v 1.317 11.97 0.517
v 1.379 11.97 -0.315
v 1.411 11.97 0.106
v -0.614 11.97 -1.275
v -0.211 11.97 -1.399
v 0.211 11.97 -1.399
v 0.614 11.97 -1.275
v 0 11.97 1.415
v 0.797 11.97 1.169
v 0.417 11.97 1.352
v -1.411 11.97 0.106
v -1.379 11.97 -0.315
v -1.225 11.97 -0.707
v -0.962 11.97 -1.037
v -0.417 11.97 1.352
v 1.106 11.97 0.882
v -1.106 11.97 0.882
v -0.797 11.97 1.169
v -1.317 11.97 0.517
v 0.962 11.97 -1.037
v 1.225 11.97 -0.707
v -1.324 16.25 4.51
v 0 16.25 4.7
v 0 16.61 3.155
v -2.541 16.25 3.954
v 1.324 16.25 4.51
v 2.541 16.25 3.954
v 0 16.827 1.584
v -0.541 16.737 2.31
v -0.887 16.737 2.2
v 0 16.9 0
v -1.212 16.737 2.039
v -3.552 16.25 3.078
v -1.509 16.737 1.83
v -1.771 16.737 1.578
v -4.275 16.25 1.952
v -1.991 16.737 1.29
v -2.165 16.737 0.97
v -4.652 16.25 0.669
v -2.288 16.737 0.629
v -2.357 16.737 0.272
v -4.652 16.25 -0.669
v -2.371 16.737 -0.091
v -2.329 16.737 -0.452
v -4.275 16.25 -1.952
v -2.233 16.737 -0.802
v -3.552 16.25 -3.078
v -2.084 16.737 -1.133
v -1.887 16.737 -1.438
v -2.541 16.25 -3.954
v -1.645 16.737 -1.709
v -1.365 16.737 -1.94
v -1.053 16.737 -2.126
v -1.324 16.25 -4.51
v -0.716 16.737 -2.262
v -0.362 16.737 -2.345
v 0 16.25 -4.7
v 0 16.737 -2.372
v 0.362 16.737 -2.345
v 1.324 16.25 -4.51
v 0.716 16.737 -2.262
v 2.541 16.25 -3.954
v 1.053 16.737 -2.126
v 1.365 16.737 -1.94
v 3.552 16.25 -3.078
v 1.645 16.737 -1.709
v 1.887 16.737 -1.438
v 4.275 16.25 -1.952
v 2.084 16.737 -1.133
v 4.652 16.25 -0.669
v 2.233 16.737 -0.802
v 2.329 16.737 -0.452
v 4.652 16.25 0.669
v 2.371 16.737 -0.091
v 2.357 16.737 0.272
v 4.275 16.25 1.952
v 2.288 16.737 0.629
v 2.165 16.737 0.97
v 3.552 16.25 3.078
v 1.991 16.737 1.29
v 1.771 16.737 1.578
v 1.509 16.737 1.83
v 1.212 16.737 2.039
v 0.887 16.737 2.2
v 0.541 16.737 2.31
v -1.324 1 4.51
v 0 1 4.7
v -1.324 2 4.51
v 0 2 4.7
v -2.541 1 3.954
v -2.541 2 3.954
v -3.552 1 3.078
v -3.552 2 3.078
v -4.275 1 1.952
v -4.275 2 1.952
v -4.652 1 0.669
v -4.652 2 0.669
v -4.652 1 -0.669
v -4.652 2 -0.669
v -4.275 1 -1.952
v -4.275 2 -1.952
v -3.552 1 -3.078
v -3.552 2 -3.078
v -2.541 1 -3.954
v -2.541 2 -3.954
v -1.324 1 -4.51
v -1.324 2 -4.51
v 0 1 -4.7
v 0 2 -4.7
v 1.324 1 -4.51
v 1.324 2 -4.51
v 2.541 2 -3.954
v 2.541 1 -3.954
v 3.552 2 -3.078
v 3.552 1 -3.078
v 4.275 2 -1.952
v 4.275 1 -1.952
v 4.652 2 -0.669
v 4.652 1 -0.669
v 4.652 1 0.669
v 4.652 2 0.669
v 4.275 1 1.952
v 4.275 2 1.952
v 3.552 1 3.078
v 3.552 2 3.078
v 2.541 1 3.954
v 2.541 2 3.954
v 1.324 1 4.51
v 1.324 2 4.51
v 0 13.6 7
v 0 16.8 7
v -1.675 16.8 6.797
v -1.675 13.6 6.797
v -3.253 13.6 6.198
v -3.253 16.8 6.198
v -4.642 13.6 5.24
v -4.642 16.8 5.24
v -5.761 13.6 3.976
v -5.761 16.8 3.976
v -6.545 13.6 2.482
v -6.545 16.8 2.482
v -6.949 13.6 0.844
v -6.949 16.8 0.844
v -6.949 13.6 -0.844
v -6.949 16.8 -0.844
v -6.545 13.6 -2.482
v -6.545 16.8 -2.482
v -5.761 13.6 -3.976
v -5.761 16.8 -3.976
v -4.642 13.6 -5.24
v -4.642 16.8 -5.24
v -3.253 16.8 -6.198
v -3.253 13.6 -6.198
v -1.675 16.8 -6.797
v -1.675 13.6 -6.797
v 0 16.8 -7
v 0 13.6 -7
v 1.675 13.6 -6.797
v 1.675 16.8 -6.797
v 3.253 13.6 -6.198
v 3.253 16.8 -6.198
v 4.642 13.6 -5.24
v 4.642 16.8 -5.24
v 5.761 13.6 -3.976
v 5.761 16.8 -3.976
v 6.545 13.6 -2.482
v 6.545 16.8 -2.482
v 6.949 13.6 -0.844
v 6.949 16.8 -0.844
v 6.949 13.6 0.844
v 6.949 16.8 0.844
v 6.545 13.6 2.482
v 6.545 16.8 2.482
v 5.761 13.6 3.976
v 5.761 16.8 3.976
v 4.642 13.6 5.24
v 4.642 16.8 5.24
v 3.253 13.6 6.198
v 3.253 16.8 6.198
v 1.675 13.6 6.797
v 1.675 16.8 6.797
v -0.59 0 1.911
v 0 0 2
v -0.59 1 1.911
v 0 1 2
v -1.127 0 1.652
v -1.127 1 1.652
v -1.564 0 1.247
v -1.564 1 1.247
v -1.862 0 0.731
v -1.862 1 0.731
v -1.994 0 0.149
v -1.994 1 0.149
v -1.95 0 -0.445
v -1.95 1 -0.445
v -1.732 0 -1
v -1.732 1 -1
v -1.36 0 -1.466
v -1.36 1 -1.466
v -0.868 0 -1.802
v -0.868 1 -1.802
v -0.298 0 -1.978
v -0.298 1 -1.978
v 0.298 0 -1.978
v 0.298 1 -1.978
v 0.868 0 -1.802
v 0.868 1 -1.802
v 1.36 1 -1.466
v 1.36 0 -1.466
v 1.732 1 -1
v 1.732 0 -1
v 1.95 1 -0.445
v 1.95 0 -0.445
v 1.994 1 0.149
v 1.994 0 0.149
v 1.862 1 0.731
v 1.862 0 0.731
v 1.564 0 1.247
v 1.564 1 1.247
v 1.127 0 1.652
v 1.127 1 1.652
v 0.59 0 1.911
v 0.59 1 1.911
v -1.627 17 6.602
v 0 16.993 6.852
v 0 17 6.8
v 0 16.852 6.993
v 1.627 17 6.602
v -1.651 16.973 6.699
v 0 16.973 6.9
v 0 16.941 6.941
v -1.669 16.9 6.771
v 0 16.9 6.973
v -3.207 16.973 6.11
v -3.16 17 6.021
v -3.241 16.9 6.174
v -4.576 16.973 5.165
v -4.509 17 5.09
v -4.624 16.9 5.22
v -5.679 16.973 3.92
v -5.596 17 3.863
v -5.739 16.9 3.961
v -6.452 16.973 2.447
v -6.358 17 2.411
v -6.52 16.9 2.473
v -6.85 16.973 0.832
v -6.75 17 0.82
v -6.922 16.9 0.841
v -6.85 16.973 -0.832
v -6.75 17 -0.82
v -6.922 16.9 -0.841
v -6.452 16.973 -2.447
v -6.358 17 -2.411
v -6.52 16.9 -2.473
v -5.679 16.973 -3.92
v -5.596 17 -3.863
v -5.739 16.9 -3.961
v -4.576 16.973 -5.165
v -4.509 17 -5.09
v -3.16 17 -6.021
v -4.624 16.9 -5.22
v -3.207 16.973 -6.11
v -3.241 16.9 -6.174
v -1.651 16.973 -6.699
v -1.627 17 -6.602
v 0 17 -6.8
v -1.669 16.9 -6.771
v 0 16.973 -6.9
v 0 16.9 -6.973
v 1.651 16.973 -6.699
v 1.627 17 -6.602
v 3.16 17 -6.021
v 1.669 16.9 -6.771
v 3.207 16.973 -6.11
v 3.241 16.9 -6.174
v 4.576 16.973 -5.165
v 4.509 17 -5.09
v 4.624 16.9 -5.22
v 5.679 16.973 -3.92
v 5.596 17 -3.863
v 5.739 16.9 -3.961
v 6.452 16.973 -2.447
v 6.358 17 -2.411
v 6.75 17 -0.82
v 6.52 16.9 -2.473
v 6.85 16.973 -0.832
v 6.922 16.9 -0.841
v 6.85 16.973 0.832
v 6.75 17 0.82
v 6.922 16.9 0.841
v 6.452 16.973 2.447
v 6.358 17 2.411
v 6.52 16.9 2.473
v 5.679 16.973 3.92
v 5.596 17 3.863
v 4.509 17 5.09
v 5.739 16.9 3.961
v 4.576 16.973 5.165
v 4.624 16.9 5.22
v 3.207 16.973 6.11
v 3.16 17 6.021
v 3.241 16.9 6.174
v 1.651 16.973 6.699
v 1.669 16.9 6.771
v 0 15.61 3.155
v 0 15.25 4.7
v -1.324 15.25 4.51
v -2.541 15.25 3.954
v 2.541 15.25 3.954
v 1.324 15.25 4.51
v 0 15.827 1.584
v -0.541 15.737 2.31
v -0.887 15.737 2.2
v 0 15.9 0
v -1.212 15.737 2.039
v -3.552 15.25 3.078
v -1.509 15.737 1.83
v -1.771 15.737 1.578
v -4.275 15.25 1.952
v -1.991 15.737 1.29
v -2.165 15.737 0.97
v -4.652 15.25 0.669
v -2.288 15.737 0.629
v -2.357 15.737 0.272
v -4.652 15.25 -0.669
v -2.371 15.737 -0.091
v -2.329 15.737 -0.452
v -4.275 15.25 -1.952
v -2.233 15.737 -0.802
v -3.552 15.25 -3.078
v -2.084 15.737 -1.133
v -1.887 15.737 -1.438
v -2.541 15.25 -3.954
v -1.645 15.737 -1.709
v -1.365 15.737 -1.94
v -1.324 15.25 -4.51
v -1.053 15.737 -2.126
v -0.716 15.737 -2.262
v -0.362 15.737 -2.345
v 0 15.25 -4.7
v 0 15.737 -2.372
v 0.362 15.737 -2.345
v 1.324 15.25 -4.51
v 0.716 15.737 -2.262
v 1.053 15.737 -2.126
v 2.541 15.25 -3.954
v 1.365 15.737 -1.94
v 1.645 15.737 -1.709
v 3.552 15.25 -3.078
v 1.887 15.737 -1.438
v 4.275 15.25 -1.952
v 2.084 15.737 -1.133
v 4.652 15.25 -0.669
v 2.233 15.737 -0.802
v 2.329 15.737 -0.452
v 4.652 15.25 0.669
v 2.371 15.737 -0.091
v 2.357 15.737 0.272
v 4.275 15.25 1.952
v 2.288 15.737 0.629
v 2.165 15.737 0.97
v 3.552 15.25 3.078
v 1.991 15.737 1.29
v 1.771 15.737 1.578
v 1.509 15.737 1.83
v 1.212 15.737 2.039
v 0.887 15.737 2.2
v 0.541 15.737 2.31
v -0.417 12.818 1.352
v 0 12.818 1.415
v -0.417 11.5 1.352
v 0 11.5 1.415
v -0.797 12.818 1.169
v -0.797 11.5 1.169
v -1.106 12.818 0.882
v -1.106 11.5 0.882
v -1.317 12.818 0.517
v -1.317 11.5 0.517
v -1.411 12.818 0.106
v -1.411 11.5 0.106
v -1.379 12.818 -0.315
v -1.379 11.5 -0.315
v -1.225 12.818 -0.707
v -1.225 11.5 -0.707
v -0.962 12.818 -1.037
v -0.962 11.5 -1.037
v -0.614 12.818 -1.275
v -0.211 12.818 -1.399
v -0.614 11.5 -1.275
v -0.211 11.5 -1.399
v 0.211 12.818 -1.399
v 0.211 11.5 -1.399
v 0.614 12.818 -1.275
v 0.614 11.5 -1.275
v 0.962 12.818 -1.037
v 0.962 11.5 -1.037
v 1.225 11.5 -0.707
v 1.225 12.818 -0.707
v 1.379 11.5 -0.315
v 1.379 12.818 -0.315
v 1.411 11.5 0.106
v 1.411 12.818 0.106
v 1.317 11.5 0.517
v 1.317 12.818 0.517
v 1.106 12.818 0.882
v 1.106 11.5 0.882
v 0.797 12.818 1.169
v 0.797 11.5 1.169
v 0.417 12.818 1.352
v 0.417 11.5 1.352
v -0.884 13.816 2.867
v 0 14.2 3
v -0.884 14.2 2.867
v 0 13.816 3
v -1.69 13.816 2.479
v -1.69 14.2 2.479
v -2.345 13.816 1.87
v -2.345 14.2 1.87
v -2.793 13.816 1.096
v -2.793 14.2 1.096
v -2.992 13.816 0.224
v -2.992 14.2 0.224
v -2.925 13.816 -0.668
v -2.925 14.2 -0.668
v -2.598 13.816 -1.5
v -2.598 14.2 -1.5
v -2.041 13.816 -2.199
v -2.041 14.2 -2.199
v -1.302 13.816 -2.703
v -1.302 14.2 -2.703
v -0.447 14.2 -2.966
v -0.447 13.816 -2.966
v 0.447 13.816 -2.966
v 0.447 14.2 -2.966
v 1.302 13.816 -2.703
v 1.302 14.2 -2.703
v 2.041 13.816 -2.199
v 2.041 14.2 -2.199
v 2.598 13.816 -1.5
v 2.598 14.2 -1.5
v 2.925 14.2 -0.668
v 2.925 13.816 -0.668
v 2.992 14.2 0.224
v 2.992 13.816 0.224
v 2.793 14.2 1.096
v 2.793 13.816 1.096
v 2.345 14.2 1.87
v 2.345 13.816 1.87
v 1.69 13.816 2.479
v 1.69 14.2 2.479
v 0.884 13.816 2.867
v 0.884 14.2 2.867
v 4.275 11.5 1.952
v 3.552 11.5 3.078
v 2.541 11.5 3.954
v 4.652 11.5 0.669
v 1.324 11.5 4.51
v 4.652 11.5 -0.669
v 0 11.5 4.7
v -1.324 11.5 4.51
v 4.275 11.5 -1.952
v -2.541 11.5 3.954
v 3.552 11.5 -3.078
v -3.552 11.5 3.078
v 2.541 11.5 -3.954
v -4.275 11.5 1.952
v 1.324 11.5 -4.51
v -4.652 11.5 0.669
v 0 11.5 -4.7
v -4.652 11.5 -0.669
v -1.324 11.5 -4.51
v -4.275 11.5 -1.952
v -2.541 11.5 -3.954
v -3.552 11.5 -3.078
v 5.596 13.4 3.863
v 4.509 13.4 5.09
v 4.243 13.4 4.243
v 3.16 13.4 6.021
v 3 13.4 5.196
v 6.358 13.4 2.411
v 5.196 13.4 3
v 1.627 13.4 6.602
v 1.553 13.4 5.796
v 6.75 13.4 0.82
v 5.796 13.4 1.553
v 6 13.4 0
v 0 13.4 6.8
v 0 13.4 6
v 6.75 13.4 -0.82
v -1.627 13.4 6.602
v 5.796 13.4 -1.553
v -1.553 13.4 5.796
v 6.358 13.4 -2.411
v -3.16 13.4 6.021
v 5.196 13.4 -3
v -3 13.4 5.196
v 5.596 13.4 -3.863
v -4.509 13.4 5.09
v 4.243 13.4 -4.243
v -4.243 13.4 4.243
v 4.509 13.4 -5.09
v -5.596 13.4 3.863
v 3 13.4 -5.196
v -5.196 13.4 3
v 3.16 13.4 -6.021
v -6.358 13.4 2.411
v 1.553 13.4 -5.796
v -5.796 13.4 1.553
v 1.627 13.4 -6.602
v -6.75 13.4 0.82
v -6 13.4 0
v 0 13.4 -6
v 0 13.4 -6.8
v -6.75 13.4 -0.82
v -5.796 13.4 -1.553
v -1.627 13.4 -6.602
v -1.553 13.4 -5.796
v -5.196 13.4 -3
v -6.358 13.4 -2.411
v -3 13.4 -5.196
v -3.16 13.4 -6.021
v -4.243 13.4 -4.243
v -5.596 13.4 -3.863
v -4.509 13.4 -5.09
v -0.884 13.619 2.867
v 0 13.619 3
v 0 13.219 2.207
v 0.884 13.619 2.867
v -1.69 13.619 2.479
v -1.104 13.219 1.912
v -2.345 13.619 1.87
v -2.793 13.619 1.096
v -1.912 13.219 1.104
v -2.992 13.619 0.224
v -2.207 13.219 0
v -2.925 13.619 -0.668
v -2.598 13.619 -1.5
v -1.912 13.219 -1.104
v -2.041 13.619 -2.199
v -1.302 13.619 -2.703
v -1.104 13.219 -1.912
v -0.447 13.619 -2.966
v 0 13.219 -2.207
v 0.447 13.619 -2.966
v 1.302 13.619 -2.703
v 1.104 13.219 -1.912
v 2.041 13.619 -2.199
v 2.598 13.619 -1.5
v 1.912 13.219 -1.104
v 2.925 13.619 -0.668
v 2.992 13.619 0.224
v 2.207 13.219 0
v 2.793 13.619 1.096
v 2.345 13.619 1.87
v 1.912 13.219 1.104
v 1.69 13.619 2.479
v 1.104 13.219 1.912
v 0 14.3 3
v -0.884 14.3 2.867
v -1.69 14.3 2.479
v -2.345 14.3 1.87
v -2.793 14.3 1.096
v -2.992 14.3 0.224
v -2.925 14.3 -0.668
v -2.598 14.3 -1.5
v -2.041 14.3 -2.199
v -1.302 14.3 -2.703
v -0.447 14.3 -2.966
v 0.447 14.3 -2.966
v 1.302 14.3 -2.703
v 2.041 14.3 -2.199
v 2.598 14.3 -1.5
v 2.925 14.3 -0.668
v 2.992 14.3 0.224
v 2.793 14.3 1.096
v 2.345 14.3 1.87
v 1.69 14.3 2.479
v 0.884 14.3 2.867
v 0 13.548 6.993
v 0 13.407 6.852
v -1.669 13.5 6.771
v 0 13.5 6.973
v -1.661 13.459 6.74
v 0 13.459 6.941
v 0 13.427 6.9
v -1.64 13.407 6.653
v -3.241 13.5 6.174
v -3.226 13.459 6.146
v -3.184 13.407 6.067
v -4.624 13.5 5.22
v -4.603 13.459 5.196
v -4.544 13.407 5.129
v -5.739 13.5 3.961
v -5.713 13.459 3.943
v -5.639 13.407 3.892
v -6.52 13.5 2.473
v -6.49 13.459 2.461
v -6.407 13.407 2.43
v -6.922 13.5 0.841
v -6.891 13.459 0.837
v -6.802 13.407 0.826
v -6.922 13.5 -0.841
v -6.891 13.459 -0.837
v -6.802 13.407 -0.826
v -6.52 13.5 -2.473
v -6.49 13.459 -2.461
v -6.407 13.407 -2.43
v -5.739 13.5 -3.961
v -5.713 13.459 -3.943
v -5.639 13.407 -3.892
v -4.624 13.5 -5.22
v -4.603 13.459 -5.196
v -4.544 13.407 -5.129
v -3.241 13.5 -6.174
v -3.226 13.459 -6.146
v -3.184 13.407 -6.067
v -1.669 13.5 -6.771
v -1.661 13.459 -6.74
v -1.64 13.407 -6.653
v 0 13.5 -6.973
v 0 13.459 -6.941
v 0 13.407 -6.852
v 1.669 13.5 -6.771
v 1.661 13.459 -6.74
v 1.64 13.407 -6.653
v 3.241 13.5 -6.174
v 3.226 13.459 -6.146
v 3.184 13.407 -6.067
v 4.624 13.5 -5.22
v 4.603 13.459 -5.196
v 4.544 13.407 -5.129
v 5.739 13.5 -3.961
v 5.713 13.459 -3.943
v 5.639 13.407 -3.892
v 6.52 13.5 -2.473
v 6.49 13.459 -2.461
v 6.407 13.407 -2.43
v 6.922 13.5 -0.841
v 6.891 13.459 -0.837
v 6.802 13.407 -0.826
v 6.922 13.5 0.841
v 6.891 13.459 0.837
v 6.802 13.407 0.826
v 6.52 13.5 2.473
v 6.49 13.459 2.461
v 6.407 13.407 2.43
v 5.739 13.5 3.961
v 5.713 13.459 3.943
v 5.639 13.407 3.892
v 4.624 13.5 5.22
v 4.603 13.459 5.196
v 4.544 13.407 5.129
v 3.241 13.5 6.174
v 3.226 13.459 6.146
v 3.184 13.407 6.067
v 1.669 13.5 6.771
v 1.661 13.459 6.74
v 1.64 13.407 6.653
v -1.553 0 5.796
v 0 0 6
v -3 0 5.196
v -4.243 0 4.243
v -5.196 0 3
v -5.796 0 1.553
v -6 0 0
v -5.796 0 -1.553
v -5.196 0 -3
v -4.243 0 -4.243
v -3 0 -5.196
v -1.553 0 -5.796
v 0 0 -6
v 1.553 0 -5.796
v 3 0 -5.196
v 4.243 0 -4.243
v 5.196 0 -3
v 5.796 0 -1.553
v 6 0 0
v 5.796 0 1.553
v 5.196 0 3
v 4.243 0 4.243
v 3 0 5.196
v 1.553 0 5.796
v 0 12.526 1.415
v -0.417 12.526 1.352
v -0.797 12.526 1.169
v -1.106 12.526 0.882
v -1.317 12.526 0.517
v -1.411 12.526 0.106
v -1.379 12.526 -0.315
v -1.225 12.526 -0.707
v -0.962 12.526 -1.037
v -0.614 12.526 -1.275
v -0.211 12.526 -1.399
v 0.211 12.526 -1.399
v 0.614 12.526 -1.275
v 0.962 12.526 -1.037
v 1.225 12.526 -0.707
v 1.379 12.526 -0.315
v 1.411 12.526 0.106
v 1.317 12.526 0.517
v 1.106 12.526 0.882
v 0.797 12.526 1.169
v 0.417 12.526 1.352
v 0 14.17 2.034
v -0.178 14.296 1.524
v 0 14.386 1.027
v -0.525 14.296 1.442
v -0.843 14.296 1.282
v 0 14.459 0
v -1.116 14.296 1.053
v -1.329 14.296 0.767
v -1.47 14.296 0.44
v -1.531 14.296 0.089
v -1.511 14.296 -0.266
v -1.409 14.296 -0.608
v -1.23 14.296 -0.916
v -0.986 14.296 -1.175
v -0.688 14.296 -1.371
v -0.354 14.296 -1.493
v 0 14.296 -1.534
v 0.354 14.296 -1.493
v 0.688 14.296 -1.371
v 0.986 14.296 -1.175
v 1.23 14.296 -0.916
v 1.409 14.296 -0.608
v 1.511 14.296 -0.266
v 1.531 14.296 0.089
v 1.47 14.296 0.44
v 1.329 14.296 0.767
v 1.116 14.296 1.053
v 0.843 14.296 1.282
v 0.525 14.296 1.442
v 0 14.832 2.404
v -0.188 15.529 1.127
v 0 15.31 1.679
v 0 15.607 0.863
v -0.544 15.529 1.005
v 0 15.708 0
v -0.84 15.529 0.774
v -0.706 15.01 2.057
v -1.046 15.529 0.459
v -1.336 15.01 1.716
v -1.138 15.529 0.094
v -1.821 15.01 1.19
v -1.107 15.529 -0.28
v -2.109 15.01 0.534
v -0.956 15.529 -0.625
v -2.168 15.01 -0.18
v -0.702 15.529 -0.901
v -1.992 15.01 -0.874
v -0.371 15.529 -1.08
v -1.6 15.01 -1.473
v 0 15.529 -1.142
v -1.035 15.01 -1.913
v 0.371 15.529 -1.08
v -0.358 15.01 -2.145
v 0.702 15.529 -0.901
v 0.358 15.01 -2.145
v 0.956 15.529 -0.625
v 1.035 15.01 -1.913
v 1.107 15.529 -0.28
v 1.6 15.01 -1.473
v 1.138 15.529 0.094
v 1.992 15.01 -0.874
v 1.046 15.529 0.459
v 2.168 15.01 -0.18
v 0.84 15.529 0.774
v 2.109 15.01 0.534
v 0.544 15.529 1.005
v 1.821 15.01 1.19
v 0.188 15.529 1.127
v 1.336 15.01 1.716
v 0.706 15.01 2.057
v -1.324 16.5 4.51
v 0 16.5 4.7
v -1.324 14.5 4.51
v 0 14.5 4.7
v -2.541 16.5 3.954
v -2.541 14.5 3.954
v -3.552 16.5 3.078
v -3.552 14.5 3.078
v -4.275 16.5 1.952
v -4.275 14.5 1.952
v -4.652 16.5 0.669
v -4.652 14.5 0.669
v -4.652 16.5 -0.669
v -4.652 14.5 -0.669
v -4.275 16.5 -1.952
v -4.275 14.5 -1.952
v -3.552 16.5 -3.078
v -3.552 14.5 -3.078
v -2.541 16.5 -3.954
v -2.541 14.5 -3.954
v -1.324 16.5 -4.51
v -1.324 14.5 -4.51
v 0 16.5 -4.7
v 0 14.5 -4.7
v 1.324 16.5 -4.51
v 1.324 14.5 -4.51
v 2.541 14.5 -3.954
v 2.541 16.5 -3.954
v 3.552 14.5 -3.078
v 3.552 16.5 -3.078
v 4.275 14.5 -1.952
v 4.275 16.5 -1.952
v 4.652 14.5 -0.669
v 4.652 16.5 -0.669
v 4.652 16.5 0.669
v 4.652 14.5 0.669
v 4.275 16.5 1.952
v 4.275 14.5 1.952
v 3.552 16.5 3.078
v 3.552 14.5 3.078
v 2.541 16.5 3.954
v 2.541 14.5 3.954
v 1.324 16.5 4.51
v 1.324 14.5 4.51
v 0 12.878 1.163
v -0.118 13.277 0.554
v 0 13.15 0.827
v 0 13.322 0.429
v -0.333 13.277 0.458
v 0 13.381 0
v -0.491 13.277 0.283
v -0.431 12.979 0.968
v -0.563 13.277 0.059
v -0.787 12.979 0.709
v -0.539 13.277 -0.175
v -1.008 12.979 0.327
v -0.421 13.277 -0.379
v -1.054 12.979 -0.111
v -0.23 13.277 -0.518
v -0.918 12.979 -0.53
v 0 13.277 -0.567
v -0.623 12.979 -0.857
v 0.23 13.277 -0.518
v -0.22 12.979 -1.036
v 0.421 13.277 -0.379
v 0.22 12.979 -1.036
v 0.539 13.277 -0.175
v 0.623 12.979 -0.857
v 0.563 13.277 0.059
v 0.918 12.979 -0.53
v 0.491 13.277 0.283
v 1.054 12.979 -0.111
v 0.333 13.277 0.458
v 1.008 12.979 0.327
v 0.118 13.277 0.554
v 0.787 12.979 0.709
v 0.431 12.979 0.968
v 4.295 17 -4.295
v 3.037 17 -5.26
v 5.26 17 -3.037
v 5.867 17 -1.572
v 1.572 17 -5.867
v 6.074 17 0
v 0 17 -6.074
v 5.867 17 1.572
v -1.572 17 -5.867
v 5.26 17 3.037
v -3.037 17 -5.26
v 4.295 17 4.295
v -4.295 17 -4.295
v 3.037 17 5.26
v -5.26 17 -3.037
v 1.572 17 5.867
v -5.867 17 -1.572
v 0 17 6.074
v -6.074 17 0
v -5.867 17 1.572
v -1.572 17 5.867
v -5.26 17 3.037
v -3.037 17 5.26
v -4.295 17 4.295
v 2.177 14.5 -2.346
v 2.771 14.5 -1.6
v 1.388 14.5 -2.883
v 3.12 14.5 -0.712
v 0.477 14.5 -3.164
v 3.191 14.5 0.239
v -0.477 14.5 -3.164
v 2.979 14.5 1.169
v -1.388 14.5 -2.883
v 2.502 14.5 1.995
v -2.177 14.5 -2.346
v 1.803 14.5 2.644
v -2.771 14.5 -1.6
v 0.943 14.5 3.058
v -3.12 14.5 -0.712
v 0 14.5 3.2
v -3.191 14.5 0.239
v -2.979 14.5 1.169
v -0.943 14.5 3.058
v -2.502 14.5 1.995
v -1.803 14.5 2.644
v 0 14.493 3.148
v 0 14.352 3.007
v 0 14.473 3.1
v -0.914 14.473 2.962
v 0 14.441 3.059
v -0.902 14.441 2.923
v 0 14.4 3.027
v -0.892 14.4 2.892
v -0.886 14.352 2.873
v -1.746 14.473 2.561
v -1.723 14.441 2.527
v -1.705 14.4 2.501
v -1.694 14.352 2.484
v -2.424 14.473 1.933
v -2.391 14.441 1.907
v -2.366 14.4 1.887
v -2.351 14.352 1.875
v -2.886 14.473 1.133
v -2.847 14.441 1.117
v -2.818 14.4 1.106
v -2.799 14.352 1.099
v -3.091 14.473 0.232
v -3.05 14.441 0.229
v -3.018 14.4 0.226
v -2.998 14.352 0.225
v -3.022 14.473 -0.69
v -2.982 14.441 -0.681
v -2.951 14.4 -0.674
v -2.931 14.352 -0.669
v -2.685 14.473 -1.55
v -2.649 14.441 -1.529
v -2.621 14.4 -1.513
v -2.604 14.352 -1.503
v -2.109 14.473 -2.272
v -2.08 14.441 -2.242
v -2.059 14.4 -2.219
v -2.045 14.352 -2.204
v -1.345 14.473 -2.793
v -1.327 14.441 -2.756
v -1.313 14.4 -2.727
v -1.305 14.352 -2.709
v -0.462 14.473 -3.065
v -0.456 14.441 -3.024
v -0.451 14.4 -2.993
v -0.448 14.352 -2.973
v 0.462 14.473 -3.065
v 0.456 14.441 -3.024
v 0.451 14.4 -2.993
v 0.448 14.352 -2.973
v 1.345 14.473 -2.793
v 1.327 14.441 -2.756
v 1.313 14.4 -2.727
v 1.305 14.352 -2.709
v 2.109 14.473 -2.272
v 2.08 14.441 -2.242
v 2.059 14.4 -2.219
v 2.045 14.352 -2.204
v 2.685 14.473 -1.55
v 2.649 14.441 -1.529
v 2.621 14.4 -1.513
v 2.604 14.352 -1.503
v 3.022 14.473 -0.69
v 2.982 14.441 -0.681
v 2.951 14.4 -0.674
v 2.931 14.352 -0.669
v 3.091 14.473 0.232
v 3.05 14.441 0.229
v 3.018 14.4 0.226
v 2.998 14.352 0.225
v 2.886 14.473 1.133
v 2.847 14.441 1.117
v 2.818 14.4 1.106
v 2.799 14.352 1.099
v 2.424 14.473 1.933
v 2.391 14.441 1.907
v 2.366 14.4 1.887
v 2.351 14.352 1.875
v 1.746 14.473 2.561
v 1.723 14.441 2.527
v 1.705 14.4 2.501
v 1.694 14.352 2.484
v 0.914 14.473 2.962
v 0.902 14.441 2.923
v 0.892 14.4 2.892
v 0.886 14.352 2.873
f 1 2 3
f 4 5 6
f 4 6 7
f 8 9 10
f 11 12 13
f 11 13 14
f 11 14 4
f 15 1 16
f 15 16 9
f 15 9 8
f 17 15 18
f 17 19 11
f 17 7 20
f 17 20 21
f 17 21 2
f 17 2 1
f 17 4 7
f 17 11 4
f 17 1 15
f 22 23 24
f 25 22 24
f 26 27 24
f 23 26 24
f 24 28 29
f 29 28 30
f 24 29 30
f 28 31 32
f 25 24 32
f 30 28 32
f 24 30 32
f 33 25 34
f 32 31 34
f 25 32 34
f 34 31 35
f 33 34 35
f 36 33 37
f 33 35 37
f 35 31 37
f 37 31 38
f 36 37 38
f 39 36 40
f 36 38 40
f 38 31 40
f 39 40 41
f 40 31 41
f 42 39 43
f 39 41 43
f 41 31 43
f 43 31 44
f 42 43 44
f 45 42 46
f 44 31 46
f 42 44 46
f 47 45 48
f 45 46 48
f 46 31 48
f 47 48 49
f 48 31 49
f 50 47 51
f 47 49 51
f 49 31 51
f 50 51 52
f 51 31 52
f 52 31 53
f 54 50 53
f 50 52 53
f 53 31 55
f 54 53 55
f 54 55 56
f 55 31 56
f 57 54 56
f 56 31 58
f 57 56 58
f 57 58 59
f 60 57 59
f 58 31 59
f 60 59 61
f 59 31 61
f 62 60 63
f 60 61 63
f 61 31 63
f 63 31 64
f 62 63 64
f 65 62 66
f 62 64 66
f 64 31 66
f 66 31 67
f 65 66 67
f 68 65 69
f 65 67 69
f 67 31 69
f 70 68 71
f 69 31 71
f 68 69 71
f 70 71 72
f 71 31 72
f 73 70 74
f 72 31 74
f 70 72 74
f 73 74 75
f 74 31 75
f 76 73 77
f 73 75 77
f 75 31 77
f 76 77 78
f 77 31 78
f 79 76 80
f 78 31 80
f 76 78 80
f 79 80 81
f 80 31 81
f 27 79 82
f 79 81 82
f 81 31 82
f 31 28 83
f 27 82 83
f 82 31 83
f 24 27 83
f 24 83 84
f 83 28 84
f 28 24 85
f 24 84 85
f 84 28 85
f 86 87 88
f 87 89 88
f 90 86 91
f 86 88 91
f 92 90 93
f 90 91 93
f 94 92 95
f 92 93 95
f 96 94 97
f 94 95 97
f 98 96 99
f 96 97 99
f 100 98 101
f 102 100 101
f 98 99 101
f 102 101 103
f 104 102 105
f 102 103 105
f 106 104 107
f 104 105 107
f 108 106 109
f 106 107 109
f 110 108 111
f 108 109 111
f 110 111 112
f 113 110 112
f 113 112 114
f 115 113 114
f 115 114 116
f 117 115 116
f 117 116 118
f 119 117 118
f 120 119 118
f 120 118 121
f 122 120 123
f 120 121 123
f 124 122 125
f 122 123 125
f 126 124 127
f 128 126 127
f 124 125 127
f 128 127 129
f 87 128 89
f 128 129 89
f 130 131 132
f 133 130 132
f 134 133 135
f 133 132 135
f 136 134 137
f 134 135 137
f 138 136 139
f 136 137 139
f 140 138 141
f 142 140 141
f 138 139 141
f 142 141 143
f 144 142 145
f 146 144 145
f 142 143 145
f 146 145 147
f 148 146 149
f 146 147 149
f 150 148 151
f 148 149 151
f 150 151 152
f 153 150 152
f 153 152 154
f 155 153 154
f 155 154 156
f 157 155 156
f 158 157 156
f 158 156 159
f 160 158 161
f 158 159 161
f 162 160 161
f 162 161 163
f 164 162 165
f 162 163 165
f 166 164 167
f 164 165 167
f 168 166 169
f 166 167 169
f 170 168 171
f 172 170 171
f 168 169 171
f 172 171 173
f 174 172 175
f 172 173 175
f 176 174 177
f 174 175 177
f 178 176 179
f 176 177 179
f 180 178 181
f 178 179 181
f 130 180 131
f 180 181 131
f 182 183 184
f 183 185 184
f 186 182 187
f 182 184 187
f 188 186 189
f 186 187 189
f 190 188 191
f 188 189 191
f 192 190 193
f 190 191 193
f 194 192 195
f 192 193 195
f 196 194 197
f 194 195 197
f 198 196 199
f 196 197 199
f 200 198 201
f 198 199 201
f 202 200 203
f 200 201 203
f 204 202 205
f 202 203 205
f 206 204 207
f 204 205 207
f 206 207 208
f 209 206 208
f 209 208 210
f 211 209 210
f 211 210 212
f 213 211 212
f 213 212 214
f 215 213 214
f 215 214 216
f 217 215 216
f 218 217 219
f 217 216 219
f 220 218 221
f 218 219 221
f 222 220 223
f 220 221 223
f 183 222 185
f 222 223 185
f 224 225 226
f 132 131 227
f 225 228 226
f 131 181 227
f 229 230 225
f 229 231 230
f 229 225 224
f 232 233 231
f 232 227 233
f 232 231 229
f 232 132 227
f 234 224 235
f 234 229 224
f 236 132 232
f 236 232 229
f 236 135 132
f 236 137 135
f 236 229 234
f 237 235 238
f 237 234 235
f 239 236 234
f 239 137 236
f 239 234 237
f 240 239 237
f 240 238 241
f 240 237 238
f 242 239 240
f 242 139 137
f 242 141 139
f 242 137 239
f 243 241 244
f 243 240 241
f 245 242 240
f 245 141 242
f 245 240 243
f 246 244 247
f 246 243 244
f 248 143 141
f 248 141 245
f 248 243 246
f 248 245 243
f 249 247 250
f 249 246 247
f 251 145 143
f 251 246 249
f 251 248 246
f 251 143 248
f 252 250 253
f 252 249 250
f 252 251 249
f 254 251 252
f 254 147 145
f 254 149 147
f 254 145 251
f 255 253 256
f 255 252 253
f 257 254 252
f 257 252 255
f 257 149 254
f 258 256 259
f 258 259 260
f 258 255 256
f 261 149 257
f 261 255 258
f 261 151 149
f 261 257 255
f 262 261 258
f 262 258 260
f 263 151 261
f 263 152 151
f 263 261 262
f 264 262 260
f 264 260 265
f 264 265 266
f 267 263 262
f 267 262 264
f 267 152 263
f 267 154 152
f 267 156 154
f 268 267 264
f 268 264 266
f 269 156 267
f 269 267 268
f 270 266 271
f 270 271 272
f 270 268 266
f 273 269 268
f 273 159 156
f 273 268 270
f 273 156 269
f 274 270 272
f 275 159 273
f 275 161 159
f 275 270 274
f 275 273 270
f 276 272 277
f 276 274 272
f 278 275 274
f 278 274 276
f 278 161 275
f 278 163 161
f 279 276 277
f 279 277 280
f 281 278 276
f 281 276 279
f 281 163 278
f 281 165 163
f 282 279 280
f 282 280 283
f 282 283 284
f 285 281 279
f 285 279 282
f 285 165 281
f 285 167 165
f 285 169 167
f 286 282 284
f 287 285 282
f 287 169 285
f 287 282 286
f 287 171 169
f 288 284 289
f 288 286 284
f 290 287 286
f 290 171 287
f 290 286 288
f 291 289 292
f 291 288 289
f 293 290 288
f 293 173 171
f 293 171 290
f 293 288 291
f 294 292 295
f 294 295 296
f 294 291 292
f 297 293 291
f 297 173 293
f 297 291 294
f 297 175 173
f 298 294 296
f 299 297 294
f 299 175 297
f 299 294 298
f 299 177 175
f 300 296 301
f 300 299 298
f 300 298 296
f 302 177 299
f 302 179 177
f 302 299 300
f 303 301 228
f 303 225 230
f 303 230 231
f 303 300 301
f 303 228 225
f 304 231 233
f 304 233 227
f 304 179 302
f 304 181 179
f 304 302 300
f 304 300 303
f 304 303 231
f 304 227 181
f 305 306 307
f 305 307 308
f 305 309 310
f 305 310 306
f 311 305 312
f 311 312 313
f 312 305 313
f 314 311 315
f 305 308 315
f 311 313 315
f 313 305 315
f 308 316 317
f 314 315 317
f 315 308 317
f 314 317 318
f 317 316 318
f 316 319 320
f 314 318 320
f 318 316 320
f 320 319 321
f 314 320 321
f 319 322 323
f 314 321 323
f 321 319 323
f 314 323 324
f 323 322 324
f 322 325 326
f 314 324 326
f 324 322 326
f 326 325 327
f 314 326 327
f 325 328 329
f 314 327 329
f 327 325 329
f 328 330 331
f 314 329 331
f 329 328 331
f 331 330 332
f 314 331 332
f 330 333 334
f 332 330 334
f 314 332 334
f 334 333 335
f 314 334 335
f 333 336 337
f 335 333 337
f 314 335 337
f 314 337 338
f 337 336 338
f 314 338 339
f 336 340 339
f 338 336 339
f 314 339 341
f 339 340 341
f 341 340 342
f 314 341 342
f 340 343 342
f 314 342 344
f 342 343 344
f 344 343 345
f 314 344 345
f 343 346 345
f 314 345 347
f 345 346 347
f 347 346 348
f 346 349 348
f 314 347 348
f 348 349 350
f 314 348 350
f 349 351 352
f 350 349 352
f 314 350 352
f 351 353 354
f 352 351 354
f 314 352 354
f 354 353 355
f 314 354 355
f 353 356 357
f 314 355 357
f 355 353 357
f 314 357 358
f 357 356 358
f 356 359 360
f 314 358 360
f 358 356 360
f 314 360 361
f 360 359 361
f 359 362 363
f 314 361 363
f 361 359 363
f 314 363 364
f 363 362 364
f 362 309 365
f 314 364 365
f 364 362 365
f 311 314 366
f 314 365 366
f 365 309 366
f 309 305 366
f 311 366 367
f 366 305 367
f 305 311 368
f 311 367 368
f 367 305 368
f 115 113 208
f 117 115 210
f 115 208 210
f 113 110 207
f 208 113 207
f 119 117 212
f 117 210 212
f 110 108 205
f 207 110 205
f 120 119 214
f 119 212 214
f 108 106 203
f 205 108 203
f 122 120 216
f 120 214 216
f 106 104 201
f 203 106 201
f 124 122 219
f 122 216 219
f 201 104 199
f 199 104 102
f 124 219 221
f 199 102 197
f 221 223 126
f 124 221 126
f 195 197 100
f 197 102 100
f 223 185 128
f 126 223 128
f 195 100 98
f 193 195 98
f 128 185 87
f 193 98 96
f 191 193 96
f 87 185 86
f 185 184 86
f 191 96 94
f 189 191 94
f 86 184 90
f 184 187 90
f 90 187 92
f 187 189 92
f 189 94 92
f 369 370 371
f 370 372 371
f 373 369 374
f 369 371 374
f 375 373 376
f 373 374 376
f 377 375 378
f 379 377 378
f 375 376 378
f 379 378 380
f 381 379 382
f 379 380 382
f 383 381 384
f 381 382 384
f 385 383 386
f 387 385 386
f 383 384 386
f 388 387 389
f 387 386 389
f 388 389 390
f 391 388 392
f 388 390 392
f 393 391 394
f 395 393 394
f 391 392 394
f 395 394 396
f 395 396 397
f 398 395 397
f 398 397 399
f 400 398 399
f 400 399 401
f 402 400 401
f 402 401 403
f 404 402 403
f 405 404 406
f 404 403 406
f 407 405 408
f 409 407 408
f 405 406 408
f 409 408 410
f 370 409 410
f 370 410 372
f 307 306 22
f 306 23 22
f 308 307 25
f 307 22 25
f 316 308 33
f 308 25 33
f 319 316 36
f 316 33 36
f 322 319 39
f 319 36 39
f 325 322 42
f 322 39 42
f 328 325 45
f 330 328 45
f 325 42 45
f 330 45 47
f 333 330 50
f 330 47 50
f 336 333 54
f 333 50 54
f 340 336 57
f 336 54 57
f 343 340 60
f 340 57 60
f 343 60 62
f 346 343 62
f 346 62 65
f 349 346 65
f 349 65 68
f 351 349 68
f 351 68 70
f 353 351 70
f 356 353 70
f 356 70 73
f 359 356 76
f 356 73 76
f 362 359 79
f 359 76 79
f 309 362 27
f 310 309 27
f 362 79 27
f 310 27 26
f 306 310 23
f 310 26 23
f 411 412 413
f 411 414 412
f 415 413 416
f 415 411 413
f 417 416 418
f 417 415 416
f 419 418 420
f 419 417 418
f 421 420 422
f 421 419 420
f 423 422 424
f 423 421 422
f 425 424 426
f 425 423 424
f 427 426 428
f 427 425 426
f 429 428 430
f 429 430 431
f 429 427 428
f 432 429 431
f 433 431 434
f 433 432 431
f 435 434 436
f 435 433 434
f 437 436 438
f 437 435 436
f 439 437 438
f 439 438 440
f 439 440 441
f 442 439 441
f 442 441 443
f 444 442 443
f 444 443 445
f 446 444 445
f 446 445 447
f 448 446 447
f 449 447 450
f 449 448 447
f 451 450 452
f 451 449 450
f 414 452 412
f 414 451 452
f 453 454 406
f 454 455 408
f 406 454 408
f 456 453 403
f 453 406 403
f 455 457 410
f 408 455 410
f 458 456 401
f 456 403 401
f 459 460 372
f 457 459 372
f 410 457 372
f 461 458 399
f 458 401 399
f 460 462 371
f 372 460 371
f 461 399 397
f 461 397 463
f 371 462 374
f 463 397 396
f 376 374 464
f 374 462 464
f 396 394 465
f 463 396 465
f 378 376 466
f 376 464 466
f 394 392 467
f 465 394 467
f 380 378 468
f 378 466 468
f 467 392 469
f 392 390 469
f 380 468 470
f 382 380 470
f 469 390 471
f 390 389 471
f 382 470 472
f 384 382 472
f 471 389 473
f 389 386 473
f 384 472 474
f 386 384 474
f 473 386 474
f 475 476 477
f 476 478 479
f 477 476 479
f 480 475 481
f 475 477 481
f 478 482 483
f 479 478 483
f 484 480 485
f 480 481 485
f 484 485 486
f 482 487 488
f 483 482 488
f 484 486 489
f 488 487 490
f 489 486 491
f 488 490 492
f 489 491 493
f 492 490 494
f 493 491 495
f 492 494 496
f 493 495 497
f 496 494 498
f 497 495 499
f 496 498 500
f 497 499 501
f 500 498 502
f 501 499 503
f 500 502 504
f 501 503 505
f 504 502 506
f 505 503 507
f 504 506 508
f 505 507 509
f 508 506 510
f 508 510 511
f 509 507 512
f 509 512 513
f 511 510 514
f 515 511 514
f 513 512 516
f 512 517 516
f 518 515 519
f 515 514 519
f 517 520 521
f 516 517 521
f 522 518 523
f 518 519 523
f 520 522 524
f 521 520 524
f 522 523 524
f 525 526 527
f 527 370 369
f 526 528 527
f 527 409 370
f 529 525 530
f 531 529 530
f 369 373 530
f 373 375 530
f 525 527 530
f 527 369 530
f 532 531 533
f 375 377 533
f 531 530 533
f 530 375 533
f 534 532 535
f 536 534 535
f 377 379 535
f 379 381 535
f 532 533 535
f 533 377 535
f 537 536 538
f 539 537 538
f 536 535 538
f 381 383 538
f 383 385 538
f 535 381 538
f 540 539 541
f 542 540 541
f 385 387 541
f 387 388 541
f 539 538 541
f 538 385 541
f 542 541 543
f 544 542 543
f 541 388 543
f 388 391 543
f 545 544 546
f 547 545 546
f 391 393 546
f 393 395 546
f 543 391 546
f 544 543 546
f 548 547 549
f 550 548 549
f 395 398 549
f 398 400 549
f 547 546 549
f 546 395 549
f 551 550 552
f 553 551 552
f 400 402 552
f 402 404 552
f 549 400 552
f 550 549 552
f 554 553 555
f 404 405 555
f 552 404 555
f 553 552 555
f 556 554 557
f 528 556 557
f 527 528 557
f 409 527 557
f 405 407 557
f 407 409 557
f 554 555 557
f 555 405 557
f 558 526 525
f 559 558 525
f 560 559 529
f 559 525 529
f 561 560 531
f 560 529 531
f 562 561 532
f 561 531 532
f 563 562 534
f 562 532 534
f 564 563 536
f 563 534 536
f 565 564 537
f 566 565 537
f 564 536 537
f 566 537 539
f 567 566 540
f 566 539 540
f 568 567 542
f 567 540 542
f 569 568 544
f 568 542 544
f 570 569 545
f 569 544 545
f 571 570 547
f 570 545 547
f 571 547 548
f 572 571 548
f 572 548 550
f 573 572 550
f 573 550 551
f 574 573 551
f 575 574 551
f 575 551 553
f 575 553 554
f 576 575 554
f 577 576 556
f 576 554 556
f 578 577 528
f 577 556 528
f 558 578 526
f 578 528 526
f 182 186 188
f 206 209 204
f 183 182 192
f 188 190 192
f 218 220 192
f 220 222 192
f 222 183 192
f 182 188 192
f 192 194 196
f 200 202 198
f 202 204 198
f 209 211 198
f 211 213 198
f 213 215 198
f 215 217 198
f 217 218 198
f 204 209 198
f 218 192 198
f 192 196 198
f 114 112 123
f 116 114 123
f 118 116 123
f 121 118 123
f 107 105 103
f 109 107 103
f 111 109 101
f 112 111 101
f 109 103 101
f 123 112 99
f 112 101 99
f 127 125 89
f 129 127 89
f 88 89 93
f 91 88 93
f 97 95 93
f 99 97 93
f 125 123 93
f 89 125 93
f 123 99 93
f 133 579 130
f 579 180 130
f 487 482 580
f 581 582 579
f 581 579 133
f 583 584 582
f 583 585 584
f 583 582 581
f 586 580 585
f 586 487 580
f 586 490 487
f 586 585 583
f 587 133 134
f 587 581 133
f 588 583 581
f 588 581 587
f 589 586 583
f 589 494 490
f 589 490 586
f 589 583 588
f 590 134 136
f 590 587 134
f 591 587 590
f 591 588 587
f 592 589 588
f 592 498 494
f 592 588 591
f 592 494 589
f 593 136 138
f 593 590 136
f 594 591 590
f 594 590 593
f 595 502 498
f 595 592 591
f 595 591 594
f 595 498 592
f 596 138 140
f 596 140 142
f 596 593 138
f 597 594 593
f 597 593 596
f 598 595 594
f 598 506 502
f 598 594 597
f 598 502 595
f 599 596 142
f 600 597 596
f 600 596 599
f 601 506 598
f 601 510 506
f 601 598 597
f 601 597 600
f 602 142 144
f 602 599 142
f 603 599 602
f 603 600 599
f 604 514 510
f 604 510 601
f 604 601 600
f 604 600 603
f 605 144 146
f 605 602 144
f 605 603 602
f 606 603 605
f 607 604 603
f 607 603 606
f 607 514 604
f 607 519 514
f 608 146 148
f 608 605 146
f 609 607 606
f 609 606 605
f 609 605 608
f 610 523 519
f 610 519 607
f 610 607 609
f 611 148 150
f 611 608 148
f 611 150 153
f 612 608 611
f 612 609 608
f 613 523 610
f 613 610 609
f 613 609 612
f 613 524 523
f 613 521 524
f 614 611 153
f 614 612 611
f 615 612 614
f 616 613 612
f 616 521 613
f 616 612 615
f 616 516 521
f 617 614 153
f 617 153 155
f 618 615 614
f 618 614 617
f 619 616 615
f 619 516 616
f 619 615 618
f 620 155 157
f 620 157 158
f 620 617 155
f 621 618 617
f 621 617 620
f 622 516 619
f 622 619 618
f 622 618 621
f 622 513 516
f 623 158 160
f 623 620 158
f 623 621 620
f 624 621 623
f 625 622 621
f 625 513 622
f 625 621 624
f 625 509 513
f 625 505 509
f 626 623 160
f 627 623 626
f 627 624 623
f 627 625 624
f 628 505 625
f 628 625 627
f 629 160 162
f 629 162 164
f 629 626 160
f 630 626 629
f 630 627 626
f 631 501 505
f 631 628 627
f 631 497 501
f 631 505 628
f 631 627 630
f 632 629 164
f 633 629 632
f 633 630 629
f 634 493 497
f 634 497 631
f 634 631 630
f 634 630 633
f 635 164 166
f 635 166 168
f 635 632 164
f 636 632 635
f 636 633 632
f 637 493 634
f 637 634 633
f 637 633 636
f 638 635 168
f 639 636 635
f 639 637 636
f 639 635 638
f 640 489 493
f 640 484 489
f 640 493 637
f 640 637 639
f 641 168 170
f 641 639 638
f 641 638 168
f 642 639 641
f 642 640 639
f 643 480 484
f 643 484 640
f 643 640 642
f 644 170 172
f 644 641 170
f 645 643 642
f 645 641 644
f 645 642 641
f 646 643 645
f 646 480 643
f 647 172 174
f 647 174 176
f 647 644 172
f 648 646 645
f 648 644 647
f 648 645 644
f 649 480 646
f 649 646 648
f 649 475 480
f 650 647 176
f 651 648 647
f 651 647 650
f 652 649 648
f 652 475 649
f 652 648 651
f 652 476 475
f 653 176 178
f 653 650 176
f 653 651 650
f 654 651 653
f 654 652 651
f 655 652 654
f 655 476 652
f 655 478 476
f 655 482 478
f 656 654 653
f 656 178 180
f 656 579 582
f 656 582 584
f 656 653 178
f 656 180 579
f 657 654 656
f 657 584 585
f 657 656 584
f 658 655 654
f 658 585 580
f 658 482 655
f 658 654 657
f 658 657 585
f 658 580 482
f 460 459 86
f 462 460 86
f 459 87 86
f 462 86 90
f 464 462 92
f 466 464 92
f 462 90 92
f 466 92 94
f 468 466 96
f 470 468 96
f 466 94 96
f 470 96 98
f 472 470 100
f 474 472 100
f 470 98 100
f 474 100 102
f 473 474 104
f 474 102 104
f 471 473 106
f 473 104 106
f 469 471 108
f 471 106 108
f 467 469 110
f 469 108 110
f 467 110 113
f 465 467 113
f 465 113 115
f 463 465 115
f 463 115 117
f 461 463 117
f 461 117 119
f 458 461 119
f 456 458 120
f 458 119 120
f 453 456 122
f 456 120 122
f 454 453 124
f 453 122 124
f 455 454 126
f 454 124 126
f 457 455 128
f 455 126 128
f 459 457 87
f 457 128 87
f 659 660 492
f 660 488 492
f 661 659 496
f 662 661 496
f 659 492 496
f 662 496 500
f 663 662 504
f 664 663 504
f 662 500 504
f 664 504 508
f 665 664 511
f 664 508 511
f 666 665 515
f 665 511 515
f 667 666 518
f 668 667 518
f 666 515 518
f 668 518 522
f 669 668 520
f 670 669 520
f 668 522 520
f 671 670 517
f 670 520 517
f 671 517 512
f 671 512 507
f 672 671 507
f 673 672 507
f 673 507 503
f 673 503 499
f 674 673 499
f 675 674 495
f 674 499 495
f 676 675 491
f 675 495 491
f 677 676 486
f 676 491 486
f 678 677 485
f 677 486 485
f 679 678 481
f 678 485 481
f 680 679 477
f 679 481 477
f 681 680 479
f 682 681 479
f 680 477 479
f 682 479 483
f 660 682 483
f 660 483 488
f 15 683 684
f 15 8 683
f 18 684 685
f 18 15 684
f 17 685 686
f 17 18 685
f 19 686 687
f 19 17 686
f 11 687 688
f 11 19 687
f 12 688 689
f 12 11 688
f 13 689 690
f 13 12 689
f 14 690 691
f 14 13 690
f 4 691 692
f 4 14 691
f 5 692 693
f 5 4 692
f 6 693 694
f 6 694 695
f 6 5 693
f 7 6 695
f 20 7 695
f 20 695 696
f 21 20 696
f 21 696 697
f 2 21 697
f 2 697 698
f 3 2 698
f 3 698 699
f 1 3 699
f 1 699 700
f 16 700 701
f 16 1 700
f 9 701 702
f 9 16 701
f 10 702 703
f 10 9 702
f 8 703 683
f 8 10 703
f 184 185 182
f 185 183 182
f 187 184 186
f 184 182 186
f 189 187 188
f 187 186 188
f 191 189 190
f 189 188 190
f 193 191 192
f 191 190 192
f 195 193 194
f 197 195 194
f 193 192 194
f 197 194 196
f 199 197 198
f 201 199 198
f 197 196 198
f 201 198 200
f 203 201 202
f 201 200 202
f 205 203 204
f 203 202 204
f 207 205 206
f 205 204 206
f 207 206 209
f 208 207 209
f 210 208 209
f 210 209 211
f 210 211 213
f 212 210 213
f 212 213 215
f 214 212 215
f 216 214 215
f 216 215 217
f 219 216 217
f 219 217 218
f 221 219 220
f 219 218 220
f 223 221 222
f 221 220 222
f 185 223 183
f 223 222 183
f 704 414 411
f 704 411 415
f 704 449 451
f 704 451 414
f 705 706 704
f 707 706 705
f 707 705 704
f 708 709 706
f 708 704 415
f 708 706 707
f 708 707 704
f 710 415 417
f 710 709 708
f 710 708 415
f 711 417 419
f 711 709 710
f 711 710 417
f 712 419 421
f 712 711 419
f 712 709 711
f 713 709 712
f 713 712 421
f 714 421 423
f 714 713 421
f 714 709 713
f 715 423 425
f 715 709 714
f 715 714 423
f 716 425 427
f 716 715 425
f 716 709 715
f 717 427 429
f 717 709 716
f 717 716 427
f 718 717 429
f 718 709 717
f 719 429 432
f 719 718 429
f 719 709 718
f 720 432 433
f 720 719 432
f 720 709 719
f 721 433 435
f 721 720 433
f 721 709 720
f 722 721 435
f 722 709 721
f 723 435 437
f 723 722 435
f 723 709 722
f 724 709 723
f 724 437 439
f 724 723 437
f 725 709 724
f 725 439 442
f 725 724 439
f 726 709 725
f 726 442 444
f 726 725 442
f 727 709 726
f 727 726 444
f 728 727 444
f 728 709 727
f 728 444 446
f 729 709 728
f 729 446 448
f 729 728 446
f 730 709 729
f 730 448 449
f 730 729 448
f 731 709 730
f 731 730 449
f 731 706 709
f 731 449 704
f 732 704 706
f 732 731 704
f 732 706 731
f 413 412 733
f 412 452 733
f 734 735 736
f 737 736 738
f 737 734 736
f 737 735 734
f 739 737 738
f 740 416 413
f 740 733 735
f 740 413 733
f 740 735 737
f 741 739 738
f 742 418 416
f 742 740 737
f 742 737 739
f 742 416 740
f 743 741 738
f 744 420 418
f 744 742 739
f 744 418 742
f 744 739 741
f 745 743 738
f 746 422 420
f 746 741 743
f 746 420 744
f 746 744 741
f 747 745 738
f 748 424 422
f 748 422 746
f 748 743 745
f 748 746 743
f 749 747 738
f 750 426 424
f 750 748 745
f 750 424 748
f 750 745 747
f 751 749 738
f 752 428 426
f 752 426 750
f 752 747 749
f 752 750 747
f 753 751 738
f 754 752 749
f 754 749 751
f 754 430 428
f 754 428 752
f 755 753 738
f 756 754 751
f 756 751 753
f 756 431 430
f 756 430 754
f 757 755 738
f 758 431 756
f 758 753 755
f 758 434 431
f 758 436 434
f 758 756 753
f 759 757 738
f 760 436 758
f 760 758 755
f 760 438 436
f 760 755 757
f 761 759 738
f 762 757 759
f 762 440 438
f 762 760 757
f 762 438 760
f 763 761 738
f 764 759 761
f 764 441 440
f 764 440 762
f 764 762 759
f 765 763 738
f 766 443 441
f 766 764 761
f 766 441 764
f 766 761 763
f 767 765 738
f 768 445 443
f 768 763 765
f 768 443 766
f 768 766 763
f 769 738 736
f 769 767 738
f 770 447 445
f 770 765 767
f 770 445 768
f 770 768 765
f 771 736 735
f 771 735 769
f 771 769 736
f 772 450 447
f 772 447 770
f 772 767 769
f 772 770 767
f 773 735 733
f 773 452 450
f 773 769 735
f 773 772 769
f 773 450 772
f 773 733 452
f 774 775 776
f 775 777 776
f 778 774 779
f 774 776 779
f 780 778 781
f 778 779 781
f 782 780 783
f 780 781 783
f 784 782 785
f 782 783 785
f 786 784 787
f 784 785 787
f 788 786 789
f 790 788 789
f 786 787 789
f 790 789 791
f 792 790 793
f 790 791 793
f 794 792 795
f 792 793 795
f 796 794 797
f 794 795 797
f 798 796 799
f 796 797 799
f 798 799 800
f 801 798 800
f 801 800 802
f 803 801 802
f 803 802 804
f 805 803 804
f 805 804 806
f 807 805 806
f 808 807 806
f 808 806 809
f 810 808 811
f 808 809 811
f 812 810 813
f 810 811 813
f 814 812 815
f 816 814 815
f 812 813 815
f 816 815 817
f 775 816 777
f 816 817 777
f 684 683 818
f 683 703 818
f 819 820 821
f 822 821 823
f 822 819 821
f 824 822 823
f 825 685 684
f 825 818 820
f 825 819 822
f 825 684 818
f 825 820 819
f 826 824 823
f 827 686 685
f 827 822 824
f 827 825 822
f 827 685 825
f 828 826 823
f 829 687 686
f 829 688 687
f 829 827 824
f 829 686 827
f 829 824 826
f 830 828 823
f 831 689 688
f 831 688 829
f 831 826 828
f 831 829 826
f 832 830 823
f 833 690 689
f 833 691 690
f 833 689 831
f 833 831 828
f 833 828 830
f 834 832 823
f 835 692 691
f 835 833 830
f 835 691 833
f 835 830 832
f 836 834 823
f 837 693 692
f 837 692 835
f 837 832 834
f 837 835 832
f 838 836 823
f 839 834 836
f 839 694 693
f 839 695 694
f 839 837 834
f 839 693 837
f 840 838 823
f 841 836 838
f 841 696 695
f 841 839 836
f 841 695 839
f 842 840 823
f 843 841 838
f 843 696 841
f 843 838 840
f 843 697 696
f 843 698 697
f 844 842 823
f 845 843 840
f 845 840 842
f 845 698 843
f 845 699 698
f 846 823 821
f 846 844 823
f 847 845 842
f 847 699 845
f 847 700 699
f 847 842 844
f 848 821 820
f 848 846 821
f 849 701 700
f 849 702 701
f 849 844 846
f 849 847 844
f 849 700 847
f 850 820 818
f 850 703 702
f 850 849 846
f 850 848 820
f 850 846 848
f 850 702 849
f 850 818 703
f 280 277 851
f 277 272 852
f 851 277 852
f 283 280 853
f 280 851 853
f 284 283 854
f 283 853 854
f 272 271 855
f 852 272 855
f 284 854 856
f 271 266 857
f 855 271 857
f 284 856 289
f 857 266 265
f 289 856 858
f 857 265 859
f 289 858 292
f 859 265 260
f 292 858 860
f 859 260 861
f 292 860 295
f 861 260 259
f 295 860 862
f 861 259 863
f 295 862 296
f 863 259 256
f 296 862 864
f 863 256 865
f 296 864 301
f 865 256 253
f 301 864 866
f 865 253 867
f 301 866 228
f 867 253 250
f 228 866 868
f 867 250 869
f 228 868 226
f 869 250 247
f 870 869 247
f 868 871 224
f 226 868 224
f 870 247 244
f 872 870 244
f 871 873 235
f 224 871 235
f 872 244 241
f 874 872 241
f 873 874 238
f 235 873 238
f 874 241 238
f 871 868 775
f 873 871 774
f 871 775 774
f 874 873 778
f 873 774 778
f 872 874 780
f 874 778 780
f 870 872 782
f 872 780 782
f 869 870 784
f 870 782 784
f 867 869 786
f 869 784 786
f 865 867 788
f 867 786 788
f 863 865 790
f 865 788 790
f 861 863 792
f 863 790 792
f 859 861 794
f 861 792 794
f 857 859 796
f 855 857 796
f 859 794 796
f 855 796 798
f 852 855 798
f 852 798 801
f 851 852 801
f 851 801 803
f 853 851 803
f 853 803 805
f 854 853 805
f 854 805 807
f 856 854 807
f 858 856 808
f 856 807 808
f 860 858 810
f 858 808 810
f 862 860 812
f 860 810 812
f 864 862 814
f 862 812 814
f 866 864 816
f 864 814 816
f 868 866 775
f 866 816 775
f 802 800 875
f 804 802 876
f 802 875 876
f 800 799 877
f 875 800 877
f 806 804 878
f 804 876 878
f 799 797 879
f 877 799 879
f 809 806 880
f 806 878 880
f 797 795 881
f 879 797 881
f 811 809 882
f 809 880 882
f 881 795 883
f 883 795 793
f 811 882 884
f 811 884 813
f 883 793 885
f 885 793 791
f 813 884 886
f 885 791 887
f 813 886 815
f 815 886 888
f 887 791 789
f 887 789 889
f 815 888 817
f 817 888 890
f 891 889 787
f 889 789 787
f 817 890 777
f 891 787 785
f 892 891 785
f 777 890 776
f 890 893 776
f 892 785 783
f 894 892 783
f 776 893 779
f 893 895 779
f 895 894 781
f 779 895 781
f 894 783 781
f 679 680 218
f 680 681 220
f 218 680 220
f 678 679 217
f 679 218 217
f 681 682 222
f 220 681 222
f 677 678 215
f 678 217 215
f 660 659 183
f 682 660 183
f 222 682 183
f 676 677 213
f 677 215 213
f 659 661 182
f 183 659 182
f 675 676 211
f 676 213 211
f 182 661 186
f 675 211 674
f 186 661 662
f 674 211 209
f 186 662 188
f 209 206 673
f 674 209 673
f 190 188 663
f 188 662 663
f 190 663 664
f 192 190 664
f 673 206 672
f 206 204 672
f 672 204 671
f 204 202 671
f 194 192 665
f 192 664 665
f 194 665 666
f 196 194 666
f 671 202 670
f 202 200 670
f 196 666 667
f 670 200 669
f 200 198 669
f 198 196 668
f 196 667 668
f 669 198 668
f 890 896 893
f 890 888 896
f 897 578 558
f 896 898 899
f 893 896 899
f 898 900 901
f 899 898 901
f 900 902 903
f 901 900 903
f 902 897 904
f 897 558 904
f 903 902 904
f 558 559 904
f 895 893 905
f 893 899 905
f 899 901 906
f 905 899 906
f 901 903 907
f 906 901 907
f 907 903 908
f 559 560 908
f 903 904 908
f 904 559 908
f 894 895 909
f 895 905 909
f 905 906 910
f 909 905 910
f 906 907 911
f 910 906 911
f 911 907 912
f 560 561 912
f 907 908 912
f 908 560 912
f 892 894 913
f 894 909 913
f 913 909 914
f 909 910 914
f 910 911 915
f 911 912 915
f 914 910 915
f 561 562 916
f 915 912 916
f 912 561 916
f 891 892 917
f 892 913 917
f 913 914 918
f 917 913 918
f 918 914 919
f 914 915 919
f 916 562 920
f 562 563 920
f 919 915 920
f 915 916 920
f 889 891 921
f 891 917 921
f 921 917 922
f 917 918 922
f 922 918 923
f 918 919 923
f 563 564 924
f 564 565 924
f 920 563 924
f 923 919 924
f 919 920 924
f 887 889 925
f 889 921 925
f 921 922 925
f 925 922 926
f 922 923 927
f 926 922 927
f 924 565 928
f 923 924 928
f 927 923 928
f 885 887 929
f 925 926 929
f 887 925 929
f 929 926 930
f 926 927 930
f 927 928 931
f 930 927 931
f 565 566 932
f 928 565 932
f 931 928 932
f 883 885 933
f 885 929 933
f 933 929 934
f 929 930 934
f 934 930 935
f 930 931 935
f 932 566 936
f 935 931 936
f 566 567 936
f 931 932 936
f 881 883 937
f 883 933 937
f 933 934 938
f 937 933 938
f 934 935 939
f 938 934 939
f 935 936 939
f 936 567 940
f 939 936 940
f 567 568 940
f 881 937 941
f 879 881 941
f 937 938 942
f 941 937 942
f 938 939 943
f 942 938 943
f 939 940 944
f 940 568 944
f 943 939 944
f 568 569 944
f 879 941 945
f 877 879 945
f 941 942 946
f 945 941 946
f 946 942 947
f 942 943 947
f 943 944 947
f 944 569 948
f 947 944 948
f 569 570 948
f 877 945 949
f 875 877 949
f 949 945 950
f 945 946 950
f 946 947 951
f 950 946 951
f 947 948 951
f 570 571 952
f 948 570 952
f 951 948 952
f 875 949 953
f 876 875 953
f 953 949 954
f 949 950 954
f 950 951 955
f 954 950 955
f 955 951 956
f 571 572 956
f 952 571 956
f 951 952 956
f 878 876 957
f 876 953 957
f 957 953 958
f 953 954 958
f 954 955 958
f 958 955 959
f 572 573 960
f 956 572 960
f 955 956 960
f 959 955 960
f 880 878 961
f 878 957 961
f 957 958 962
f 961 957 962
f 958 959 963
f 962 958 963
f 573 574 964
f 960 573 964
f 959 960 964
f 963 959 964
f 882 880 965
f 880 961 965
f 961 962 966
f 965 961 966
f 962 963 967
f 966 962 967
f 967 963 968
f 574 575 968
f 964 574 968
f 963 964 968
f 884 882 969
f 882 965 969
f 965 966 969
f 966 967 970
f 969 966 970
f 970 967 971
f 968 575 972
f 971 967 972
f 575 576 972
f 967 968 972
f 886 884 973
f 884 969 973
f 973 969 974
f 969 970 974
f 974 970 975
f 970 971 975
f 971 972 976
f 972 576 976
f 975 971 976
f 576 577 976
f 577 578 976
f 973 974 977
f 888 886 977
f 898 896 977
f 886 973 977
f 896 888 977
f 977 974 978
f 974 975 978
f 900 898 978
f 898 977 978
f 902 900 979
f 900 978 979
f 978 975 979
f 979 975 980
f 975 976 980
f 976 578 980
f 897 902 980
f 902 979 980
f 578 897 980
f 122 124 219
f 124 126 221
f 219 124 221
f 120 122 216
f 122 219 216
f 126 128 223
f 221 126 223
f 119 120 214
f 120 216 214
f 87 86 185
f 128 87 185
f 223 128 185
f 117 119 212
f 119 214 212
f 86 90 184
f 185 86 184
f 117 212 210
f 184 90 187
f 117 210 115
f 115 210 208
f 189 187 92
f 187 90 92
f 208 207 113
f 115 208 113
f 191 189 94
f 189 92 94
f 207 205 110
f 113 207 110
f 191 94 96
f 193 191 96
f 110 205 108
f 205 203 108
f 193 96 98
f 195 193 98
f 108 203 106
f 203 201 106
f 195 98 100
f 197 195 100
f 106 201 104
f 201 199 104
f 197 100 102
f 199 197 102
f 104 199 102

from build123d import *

# Parameters (mm, degrees)
FILLET1_R = 0.2
FILLET2_R = 0.2


with BuildPart() as part:
    # Sketch2 → Revolve1 (revolve)
    with BuildSketch(Plane(origin=(0, 0, 0), x_dir=(0, 0, -1), z_dir=(1, 0, 0))):
        Polygon((-6.07373871, 17), (-4.7, 16.5), (-4.7, 14.5), (-3, 14.5), (-3, 13.61895335), (-1.414766859, 12.818441389), (-1.414766859, 11.5), (-4.7, 11.5), (-4.7, 1), (-2, 1), (-2, 0), (-6, 0), (-6, 13.4), (-7, 13.4), (-7, 17), align=None)
    revolve(axis=Axis((0, 20.636512962, 0), (0, -1, 0)))

    # Fillet1
    fillet1_edges = [part.edges().sort_by_distance(p)[0] for p in [
        (0, 14.5, -3),
    ]]
    fillet(fillet1_edges, radius=FILLET1_R)

    # Fillet2
    fillet2_edges = [part.edges().sort_by_distance(p)[0] for p in [
        (0, 13.4, -7),
        (0, 17, -7),
    ]]
    fillet(fillet2_edges, radius=FILLET2_R)


with BuildPart() as body_2:
    # Sketch3 → Revolve2 (revolve)
    with BuildSketch(Plane(origin=(0, 0, 0), x_dir=(0, 0, -1), z_dir=(1, 0, 0))):
        with BuildLine():
            Line((0, 16.9), (0, 15.9))
            ThreePointArc((0, 15.9), (-2.372366961, 15.736730337), (-4.7, 15.25))
            Line((-4.7, 15.25), (-4.7, 16.25))
            ThreePointArc((-4.7, 16.25), (-2.372366961, 16.736730337), (0, 16.9))
        make_face()
        Polygon((-2, 0), (-2, 1), (-4.7, 1), (-4.7, 2), (0, 2), (0, 0), align=None)
        with BuildLine():
            Line((-3, 14.2), (-3, 13.815689024))
            ThreePointArc((-3, 13.815689024), (-1.534048958, 14.29600477), (0, 14.458514676))
            Line((0, 14.458514676), (0, 15.708094323))
            ThreePointArc((0, 15.708094323), (-1.678864831, 15.309856799), (-3, 14.2))
        make_face()
        with BuildLine():
            Line((-1.414766859, 12.525571159), (-1.414766859, 11.970148919))
            Line((-1.414766859, 11.970148919), (0, 11.970148919))
            Line((0, 11.970148919), (0, 13.380716758))
            ThreePointArc((0, 13.380716758), (-0.82656507, 13.150320013), (-1.414766859, 12.525571159))
        make_face()
    revolve(axis=Axis((0, 16.9, 0), (0, -1, 0)))


solid = Compound([part.part, body_2.part])
